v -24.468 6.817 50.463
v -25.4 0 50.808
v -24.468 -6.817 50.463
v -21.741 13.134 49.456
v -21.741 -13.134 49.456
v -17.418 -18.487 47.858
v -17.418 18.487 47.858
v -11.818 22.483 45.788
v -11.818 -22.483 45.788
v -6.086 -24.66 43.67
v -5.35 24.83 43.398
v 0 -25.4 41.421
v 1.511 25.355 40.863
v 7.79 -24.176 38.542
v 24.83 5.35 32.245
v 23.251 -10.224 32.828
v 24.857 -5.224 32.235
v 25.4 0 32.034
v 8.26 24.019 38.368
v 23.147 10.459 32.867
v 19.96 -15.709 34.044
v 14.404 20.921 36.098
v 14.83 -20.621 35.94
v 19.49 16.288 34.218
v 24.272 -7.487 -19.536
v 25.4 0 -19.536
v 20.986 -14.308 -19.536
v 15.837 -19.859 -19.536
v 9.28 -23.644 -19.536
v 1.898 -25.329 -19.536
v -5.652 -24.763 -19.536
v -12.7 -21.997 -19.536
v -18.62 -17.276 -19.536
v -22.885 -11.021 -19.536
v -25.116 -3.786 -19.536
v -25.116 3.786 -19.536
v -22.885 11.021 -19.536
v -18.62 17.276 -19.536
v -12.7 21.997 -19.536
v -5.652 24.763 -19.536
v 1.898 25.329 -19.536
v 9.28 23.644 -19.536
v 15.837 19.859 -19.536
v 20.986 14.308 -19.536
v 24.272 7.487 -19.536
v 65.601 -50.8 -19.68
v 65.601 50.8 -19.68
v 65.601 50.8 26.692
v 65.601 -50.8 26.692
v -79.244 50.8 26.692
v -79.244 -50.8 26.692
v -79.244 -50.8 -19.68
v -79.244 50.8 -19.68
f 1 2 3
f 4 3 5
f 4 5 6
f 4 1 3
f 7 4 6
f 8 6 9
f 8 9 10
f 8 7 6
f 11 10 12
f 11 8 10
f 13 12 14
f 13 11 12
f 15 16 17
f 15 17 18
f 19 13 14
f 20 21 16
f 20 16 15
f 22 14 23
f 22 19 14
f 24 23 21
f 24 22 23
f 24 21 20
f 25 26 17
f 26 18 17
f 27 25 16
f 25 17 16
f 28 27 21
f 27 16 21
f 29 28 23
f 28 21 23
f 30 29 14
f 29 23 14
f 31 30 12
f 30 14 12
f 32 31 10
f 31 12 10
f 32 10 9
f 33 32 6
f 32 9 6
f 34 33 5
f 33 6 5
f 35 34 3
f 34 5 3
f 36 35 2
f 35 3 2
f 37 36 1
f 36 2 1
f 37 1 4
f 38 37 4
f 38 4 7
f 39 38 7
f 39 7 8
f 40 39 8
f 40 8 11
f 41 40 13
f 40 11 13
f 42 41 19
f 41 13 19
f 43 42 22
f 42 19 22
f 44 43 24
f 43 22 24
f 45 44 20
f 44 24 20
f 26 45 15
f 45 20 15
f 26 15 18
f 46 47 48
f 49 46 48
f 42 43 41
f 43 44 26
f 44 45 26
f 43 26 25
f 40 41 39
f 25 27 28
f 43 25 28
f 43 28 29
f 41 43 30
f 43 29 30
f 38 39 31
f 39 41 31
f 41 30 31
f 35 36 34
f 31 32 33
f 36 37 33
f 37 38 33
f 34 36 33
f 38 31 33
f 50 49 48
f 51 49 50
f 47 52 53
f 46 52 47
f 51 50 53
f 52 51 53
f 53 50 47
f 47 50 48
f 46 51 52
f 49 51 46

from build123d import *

# Parameters (mm, degrees)
F1_DEPTH      = 50.8
F2_W          = 25.4
F2_H          = 70.4181268811
F5_DEPTH      = 127
F5_DEPTH_BACK = 25.4


with BuildPart() as f1:
    # F0 (on Front) → F1 (new body, symmetric)
    with BuildSketch(Plane.XZ):
        Polygon((65.6014406245, -19.6795935976), (65.6014406245, 26.6920606943), (-79.2436958414, 26.6920606943), (-79.2436958414, -19.6795935976), (-17.5021556386, -19.6795935976), (33.2978443614, -19.6795935976), align=None)
    extrude(amount=F1_DEPTH, both=True)


with BuildPart() as f3:
    # F2 (on Front) → F3 (revolve)
    with BuildSketch(Plane.XZ):
        with Locations((12.7, 15.6728737056)):
            Rectangle(F2_W, F2_H)
    revolve(axis=Axis((0, 0, 15.6728737056), (0, 0, -1)))

    # F4 (on Front) → F5 (cut, two sides)
    with BuildSketch(Plane.XZ) as f5_sk:
        Polygon((25.4, 32.0339436078), (25.4, 50.9257381415), (-25.7189797187, 50.9257381415), align=None)
    extrude(amount=-F5_DEPTH, mode=Mode.SUBTRACT)
    extrude(f5_sk.sketch, amount=F5_DEPTH_BACK, mode=Mode.SUBTRACT)


solid = Compound([f1.part, f3.part])
